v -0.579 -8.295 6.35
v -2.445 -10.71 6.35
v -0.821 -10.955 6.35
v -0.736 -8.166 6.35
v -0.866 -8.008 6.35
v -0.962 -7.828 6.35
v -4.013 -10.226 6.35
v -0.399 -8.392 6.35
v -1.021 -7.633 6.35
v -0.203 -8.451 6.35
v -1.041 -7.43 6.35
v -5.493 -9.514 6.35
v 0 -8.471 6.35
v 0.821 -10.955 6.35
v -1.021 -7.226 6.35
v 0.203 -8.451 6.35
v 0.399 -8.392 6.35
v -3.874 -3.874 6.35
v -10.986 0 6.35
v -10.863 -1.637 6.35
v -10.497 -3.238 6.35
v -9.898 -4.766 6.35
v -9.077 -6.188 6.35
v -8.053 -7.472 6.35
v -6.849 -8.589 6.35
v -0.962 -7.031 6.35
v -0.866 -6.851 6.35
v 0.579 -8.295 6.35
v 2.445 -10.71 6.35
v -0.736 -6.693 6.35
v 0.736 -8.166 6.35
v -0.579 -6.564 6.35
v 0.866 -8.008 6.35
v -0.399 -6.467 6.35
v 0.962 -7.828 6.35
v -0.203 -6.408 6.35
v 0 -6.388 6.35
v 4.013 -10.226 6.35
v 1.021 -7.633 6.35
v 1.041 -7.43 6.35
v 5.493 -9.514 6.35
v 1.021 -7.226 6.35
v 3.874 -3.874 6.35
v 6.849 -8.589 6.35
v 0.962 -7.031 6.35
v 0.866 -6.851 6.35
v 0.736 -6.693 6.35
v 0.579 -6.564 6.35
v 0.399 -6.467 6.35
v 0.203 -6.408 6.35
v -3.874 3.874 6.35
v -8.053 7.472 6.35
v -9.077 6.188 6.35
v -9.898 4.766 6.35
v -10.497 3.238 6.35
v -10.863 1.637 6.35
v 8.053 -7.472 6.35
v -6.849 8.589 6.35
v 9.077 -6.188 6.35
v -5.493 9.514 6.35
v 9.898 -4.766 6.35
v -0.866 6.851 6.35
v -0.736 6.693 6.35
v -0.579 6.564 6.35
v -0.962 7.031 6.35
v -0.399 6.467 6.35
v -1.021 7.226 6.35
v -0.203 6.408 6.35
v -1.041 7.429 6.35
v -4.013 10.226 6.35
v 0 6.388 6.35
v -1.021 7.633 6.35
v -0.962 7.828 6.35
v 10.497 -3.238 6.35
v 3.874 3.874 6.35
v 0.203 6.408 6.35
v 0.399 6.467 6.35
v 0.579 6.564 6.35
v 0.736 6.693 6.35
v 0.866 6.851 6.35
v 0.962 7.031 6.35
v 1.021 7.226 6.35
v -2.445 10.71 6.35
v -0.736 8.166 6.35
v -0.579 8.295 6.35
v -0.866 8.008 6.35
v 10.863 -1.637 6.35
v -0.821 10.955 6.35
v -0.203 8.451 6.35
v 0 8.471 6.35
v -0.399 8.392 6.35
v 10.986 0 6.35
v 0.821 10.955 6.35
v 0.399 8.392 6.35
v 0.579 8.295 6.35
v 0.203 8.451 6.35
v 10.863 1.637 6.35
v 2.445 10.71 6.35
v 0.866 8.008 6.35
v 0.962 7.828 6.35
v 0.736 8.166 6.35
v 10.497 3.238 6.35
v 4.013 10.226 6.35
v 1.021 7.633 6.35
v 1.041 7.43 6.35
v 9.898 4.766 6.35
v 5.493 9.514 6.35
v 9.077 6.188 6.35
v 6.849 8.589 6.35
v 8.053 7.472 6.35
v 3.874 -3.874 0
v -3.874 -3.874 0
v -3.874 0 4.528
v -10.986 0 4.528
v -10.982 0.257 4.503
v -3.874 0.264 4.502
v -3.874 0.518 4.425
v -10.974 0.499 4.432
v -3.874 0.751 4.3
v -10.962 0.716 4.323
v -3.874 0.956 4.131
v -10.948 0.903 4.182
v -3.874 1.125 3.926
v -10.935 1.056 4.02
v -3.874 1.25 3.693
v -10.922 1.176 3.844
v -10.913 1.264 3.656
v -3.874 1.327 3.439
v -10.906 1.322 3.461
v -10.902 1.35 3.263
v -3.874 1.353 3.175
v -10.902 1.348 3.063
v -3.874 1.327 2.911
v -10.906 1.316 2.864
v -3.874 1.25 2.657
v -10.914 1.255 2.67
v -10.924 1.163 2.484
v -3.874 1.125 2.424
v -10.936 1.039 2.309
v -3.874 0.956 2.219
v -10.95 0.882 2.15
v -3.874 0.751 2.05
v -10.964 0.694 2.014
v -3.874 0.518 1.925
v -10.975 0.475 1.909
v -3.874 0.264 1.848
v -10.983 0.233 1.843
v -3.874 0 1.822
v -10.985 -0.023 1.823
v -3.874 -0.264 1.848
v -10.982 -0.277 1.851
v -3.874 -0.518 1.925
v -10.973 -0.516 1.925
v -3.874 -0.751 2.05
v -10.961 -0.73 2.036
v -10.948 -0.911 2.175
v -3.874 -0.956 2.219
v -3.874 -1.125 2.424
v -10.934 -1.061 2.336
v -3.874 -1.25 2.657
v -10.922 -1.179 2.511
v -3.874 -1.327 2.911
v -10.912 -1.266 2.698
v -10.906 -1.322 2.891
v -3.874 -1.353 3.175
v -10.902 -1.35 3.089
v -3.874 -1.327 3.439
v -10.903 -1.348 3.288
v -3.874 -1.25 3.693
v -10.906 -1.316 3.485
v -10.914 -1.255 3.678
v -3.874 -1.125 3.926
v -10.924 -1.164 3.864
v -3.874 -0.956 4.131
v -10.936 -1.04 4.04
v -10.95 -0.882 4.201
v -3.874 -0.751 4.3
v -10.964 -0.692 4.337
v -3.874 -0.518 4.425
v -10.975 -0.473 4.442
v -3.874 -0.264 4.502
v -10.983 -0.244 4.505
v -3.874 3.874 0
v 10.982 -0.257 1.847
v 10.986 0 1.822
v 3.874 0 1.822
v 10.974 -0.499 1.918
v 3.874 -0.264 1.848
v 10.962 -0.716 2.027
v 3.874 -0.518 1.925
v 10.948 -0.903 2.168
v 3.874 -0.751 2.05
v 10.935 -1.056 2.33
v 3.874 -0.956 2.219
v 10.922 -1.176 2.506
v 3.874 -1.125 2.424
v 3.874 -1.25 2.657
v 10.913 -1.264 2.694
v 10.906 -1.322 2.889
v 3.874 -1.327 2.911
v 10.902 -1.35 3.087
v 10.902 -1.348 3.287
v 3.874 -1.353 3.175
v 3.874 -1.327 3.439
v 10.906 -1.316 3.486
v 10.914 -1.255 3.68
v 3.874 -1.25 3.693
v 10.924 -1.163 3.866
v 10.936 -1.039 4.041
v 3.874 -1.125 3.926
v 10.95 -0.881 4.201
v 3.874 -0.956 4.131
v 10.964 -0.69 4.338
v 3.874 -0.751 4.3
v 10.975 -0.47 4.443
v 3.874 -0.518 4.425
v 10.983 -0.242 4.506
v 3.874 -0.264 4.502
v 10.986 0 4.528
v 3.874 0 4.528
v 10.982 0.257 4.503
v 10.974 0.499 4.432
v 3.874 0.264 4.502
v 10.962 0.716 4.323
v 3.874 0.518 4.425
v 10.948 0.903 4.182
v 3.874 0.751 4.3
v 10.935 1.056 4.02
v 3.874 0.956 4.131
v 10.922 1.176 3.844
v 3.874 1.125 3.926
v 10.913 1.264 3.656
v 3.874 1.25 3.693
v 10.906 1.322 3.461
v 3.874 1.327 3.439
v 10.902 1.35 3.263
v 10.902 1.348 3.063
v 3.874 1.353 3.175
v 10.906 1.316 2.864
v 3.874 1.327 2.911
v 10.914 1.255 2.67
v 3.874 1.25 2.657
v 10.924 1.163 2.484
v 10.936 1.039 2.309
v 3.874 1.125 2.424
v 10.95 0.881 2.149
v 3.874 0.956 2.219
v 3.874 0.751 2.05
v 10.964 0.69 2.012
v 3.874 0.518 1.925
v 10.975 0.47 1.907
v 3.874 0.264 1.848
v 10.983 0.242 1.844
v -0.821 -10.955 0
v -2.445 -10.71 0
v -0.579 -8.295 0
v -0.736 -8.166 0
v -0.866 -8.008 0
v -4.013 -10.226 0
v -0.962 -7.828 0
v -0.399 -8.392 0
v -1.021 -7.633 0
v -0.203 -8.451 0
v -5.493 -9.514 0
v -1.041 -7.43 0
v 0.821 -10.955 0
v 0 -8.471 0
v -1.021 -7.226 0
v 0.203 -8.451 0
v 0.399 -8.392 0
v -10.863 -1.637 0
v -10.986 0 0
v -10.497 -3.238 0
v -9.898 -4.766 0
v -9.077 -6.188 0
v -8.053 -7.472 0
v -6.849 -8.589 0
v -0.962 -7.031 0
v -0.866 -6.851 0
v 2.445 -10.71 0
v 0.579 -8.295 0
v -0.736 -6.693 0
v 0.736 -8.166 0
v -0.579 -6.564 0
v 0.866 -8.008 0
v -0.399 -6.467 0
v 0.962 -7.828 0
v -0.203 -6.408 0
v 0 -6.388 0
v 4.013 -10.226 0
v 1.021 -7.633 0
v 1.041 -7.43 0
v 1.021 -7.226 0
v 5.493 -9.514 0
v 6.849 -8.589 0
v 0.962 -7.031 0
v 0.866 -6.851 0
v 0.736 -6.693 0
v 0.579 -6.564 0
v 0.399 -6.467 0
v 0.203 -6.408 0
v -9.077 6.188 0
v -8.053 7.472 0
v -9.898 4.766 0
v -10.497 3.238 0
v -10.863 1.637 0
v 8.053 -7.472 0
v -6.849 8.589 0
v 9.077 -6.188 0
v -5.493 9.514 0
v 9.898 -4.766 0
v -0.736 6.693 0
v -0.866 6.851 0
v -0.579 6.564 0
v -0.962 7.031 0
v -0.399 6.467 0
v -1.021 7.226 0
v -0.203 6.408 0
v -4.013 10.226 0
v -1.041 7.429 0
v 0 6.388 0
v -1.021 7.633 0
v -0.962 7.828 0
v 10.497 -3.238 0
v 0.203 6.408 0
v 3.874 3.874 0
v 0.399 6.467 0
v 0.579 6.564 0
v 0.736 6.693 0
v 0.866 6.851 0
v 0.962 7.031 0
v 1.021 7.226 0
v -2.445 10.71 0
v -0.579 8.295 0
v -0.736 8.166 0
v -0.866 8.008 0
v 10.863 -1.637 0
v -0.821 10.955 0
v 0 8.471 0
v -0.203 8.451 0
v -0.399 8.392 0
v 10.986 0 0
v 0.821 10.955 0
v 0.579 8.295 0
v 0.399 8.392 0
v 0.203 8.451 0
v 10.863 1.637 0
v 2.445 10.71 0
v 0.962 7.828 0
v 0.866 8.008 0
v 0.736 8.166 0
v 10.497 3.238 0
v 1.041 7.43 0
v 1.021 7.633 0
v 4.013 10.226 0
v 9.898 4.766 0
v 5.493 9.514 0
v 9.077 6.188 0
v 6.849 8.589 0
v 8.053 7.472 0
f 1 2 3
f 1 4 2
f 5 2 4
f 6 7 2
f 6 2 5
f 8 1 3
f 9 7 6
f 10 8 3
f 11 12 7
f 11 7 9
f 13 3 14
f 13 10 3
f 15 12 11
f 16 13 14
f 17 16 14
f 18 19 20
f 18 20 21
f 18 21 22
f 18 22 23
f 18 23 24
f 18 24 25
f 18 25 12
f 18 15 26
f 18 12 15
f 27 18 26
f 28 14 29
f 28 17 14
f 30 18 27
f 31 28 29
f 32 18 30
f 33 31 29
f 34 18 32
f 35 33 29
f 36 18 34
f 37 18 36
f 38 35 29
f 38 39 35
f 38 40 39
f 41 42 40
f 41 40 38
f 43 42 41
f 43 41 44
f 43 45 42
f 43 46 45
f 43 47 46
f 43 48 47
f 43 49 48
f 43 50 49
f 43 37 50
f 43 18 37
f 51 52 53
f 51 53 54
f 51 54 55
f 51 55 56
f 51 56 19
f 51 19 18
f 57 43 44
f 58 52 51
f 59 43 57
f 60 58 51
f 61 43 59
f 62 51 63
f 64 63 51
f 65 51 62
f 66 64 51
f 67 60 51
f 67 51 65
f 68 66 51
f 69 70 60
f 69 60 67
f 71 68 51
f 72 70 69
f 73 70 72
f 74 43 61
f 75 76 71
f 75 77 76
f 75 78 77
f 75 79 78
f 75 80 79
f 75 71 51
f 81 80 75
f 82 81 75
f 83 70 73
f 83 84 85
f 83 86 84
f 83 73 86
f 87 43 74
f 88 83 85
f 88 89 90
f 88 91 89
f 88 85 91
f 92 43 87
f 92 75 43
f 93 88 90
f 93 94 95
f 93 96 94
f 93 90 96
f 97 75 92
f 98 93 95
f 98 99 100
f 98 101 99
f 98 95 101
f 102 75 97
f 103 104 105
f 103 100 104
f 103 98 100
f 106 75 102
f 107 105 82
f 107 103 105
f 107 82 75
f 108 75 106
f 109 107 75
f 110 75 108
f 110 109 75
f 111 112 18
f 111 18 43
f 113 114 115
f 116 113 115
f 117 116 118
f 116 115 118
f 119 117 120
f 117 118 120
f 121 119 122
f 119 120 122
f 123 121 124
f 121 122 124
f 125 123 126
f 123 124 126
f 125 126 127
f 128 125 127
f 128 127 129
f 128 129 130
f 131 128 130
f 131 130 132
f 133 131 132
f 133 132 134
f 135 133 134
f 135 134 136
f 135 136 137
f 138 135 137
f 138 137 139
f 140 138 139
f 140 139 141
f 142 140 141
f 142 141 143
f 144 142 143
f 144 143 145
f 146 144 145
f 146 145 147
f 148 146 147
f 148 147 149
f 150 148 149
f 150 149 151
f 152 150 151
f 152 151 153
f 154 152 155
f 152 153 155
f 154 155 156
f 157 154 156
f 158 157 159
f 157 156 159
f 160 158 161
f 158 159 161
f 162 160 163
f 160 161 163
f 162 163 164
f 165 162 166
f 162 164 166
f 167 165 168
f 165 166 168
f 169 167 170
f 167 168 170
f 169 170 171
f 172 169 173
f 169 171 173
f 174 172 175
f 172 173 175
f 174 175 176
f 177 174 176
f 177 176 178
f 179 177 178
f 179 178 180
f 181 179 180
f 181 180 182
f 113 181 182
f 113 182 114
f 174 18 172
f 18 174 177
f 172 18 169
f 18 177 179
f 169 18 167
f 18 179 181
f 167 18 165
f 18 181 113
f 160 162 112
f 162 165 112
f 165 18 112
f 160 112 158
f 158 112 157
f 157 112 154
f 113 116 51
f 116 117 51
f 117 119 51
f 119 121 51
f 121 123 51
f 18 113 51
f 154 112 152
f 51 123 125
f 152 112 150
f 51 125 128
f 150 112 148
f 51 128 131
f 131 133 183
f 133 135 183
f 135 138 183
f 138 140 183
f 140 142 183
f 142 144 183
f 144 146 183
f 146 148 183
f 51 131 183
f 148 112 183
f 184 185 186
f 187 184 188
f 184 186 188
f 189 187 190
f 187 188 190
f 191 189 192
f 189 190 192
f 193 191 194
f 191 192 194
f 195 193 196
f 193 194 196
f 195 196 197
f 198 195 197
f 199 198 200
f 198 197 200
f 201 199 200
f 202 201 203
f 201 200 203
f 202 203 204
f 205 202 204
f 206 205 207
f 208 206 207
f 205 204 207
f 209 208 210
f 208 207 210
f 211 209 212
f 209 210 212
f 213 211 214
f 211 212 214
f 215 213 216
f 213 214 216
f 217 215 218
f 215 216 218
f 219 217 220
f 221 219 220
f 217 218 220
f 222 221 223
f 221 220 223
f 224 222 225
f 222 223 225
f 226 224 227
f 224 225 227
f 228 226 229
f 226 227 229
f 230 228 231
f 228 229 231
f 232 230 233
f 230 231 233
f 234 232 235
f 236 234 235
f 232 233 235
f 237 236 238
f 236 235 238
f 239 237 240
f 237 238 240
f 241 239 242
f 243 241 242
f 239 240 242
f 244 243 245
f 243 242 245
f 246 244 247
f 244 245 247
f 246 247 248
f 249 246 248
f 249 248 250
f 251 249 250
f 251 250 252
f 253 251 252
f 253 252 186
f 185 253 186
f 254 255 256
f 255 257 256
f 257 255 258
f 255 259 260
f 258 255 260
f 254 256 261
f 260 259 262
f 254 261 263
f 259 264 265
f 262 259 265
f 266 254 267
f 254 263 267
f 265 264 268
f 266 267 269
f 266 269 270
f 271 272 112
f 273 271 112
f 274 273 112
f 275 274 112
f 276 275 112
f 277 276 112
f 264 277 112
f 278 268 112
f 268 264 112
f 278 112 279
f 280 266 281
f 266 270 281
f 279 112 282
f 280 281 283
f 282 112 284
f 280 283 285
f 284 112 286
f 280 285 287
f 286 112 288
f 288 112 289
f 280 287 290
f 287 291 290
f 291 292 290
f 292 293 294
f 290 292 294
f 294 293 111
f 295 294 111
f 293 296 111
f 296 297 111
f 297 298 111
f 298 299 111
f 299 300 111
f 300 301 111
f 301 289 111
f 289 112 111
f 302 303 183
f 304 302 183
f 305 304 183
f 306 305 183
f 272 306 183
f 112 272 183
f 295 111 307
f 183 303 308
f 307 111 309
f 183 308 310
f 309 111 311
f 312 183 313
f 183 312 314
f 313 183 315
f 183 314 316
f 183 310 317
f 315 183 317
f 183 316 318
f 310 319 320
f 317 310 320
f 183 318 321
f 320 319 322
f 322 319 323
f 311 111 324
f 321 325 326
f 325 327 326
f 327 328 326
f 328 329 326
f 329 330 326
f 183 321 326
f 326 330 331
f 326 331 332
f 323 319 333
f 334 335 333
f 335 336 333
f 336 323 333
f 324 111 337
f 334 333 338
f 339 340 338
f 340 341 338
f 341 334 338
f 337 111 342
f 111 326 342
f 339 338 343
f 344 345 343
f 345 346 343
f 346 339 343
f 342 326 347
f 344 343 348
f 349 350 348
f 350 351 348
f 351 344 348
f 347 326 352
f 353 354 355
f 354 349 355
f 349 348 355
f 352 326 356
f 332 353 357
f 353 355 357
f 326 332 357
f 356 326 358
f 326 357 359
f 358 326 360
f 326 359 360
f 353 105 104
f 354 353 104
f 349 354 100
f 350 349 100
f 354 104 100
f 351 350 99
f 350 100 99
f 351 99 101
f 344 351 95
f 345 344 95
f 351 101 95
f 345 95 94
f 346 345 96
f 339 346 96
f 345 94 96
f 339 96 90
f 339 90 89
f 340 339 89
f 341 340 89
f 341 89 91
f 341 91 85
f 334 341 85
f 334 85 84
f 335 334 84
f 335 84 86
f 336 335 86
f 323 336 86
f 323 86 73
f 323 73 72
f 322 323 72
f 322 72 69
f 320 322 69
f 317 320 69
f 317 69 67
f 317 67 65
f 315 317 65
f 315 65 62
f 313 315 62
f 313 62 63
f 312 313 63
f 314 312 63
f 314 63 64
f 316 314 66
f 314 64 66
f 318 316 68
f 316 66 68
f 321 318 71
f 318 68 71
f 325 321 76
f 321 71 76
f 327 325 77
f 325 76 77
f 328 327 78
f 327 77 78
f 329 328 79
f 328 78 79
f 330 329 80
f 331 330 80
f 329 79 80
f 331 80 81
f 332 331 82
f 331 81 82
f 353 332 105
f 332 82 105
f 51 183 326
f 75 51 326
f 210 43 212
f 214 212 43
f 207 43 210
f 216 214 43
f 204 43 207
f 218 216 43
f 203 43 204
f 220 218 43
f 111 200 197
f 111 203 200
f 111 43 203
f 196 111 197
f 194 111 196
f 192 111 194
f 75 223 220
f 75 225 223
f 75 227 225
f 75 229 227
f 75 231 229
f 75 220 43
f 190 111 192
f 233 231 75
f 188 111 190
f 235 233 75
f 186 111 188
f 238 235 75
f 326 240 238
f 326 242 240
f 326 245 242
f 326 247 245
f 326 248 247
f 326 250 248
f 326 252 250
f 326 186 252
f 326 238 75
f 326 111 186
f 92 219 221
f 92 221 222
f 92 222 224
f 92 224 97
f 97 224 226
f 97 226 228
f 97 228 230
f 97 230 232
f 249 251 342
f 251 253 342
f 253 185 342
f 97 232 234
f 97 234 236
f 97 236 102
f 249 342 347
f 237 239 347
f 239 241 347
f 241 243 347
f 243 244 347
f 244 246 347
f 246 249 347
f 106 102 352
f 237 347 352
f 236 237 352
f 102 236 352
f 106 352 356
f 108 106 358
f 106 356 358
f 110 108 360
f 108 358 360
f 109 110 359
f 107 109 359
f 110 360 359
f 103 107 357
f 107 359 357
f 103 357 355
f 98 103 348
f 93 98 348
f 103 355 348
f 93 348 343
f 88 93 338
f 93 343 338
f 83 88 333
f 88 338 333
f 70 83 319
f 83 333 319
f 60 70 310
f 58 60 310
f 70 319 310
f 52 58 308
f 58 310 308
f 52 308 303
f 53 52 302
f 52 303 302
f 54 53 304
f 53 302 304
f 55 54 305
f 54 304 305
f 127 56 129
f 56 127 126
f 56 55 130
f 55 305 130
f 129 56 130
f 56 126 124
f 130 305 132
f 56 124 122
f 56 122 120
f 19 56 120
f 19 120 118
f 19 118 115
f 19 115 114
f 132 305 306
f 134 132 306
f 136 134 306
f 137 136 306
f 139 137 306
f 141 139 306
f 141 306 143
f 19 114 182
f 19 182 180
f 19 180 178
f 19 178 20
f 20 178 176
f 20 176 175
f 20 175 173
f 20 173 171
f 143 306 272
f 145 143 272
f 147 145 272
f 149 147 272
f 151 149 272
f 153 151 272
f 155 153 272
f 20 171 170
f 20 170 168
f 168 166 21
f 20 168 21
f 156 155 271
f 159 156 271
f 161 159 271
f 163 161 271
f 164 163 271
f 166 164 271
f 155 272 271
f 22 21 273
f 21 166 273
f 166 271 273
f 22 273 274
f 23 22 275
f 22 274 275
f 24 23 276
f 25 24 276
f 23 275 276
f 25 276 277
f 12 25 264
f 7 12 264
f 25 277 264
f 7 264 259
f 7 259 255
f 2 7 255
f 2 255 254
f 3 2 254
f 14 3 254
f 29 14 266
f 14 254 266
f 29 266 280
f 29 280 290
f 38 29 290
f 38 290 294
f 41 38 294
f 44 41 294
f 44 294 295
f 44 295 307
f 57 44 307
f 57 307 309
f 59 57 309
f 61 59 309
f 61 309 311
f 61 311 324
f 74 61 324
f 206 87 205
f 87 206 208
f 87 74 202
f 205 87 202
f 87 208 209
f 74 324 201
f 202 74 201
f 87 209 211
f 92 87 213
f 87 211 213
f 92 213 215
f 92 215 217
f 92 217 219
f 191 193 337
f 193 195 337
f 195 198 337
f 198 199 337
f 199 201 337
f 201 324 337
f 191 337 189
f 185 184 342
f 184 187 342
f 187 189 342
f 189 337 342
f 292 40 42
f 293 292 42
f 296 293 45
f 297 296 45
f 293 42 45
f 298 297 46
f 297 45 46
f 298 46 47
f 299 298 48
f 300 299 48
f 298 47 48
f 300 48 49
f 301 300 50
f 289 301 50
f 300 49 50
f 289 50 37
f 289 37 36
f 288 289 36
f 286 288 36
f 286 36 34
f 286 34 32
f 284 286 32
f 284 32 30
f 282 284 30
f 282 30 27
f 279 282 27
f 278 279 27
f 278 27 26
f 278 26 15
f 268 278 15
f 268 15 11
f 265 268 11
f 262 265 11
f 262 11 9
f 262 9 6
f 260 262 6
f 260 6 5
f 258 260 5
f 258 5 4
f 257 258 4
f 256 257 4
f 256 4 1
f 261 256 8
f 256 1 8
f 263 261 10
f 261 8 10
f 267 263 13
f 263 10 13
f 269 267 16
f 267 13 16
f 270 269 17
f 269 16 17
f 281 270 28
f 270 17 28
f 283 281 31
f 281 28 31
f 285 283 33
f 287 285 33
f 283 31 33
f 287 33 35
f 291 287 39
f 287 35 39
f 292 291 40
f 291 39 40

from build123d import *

# Parameters (mm, degrees)
SKETCH1_R                           = 10.9855
SKETCH1_W                           = 7.747
SKETCH1_H                           = 7.747
BOSS_EXTRUDE1_DEPTH                 = 6.35
F_6_32_TAPPED_HOLE1_D               = 2.7051
F_6_32_TAPPED_HOLE1_DEPTH           = 7.112
F_6_32_TAPPED_HOLE1_ON_FACE_2_D     = 2.7051
F_6_32_TAPPED_HOLE1_ON_FACE_2_DEPTH = 7.112
F_6_32_TAPPED_HOLE2_D               = 2.7051
F_45_0_082_DIAMETER_HOLE1_D         = 2.0828


with BuildPart() as part:
    # Sketch1 → Boss-Extrude1 (new body)
    with BuildSketch(Plane.XY):
        Circle(SKETCH1_R)
        Rectangle(SKETCH1_W, SKETCH1_H, mode=Mode.SUBTRACT)
    extrude(amount=BOSS_EXTRUDE1_DEPTH)

    # #6-32 Tapped Hole1
    with Locations(Plane(origin=(10.9855, 0, 3.175), x_dir=(0, 0, 1), z_dir=(1, 0, 0))):
        with Locations((0, 0)):
            Hole(F_6_32_TAPPED_HOLE1_D / 2, depth=F_6_32_TAPPED_HOLE1_DEPTH)

    # #6-32 Tapped Hole1 on face 2
    with Locations(Plane(origin=(3.8735, 0, 3.175), x_dir=(0, 0, -1), z_dir=(-1, 0, 0))):
        with Locations((0, 0)):
            Hole(F_6_32_TAPPED_HOLE1_ON_FACE_2_D / 2, depth=F_6_32_TAPPED_HOLE1_ON_FACE_2_DEPTH)

    # #6-32 Tapped Hole2 (through all)
    with Locations(Plane(origin=(-3.8735, 0, 0), x_dir=(0, 0, -1), z_dir=(1, 0, 0))):
        with Locations((-3.175, 0)):
            Hole(F_6_32_TAPPED_HOLE2_D / 2)

    # #45 (0.082) Diameter Hole1 (through all)
    with Locations(Plane(origin=(0, 0, 0), x_dir=(-1, 0, 0), z_dir=(0, 0, -1))):
        with Locations((0, -7.4295), (0, 7.4295)):
            Hole(F_45_0_082_DIAMETER_HOLE1_D / 2)


solid = part.part
